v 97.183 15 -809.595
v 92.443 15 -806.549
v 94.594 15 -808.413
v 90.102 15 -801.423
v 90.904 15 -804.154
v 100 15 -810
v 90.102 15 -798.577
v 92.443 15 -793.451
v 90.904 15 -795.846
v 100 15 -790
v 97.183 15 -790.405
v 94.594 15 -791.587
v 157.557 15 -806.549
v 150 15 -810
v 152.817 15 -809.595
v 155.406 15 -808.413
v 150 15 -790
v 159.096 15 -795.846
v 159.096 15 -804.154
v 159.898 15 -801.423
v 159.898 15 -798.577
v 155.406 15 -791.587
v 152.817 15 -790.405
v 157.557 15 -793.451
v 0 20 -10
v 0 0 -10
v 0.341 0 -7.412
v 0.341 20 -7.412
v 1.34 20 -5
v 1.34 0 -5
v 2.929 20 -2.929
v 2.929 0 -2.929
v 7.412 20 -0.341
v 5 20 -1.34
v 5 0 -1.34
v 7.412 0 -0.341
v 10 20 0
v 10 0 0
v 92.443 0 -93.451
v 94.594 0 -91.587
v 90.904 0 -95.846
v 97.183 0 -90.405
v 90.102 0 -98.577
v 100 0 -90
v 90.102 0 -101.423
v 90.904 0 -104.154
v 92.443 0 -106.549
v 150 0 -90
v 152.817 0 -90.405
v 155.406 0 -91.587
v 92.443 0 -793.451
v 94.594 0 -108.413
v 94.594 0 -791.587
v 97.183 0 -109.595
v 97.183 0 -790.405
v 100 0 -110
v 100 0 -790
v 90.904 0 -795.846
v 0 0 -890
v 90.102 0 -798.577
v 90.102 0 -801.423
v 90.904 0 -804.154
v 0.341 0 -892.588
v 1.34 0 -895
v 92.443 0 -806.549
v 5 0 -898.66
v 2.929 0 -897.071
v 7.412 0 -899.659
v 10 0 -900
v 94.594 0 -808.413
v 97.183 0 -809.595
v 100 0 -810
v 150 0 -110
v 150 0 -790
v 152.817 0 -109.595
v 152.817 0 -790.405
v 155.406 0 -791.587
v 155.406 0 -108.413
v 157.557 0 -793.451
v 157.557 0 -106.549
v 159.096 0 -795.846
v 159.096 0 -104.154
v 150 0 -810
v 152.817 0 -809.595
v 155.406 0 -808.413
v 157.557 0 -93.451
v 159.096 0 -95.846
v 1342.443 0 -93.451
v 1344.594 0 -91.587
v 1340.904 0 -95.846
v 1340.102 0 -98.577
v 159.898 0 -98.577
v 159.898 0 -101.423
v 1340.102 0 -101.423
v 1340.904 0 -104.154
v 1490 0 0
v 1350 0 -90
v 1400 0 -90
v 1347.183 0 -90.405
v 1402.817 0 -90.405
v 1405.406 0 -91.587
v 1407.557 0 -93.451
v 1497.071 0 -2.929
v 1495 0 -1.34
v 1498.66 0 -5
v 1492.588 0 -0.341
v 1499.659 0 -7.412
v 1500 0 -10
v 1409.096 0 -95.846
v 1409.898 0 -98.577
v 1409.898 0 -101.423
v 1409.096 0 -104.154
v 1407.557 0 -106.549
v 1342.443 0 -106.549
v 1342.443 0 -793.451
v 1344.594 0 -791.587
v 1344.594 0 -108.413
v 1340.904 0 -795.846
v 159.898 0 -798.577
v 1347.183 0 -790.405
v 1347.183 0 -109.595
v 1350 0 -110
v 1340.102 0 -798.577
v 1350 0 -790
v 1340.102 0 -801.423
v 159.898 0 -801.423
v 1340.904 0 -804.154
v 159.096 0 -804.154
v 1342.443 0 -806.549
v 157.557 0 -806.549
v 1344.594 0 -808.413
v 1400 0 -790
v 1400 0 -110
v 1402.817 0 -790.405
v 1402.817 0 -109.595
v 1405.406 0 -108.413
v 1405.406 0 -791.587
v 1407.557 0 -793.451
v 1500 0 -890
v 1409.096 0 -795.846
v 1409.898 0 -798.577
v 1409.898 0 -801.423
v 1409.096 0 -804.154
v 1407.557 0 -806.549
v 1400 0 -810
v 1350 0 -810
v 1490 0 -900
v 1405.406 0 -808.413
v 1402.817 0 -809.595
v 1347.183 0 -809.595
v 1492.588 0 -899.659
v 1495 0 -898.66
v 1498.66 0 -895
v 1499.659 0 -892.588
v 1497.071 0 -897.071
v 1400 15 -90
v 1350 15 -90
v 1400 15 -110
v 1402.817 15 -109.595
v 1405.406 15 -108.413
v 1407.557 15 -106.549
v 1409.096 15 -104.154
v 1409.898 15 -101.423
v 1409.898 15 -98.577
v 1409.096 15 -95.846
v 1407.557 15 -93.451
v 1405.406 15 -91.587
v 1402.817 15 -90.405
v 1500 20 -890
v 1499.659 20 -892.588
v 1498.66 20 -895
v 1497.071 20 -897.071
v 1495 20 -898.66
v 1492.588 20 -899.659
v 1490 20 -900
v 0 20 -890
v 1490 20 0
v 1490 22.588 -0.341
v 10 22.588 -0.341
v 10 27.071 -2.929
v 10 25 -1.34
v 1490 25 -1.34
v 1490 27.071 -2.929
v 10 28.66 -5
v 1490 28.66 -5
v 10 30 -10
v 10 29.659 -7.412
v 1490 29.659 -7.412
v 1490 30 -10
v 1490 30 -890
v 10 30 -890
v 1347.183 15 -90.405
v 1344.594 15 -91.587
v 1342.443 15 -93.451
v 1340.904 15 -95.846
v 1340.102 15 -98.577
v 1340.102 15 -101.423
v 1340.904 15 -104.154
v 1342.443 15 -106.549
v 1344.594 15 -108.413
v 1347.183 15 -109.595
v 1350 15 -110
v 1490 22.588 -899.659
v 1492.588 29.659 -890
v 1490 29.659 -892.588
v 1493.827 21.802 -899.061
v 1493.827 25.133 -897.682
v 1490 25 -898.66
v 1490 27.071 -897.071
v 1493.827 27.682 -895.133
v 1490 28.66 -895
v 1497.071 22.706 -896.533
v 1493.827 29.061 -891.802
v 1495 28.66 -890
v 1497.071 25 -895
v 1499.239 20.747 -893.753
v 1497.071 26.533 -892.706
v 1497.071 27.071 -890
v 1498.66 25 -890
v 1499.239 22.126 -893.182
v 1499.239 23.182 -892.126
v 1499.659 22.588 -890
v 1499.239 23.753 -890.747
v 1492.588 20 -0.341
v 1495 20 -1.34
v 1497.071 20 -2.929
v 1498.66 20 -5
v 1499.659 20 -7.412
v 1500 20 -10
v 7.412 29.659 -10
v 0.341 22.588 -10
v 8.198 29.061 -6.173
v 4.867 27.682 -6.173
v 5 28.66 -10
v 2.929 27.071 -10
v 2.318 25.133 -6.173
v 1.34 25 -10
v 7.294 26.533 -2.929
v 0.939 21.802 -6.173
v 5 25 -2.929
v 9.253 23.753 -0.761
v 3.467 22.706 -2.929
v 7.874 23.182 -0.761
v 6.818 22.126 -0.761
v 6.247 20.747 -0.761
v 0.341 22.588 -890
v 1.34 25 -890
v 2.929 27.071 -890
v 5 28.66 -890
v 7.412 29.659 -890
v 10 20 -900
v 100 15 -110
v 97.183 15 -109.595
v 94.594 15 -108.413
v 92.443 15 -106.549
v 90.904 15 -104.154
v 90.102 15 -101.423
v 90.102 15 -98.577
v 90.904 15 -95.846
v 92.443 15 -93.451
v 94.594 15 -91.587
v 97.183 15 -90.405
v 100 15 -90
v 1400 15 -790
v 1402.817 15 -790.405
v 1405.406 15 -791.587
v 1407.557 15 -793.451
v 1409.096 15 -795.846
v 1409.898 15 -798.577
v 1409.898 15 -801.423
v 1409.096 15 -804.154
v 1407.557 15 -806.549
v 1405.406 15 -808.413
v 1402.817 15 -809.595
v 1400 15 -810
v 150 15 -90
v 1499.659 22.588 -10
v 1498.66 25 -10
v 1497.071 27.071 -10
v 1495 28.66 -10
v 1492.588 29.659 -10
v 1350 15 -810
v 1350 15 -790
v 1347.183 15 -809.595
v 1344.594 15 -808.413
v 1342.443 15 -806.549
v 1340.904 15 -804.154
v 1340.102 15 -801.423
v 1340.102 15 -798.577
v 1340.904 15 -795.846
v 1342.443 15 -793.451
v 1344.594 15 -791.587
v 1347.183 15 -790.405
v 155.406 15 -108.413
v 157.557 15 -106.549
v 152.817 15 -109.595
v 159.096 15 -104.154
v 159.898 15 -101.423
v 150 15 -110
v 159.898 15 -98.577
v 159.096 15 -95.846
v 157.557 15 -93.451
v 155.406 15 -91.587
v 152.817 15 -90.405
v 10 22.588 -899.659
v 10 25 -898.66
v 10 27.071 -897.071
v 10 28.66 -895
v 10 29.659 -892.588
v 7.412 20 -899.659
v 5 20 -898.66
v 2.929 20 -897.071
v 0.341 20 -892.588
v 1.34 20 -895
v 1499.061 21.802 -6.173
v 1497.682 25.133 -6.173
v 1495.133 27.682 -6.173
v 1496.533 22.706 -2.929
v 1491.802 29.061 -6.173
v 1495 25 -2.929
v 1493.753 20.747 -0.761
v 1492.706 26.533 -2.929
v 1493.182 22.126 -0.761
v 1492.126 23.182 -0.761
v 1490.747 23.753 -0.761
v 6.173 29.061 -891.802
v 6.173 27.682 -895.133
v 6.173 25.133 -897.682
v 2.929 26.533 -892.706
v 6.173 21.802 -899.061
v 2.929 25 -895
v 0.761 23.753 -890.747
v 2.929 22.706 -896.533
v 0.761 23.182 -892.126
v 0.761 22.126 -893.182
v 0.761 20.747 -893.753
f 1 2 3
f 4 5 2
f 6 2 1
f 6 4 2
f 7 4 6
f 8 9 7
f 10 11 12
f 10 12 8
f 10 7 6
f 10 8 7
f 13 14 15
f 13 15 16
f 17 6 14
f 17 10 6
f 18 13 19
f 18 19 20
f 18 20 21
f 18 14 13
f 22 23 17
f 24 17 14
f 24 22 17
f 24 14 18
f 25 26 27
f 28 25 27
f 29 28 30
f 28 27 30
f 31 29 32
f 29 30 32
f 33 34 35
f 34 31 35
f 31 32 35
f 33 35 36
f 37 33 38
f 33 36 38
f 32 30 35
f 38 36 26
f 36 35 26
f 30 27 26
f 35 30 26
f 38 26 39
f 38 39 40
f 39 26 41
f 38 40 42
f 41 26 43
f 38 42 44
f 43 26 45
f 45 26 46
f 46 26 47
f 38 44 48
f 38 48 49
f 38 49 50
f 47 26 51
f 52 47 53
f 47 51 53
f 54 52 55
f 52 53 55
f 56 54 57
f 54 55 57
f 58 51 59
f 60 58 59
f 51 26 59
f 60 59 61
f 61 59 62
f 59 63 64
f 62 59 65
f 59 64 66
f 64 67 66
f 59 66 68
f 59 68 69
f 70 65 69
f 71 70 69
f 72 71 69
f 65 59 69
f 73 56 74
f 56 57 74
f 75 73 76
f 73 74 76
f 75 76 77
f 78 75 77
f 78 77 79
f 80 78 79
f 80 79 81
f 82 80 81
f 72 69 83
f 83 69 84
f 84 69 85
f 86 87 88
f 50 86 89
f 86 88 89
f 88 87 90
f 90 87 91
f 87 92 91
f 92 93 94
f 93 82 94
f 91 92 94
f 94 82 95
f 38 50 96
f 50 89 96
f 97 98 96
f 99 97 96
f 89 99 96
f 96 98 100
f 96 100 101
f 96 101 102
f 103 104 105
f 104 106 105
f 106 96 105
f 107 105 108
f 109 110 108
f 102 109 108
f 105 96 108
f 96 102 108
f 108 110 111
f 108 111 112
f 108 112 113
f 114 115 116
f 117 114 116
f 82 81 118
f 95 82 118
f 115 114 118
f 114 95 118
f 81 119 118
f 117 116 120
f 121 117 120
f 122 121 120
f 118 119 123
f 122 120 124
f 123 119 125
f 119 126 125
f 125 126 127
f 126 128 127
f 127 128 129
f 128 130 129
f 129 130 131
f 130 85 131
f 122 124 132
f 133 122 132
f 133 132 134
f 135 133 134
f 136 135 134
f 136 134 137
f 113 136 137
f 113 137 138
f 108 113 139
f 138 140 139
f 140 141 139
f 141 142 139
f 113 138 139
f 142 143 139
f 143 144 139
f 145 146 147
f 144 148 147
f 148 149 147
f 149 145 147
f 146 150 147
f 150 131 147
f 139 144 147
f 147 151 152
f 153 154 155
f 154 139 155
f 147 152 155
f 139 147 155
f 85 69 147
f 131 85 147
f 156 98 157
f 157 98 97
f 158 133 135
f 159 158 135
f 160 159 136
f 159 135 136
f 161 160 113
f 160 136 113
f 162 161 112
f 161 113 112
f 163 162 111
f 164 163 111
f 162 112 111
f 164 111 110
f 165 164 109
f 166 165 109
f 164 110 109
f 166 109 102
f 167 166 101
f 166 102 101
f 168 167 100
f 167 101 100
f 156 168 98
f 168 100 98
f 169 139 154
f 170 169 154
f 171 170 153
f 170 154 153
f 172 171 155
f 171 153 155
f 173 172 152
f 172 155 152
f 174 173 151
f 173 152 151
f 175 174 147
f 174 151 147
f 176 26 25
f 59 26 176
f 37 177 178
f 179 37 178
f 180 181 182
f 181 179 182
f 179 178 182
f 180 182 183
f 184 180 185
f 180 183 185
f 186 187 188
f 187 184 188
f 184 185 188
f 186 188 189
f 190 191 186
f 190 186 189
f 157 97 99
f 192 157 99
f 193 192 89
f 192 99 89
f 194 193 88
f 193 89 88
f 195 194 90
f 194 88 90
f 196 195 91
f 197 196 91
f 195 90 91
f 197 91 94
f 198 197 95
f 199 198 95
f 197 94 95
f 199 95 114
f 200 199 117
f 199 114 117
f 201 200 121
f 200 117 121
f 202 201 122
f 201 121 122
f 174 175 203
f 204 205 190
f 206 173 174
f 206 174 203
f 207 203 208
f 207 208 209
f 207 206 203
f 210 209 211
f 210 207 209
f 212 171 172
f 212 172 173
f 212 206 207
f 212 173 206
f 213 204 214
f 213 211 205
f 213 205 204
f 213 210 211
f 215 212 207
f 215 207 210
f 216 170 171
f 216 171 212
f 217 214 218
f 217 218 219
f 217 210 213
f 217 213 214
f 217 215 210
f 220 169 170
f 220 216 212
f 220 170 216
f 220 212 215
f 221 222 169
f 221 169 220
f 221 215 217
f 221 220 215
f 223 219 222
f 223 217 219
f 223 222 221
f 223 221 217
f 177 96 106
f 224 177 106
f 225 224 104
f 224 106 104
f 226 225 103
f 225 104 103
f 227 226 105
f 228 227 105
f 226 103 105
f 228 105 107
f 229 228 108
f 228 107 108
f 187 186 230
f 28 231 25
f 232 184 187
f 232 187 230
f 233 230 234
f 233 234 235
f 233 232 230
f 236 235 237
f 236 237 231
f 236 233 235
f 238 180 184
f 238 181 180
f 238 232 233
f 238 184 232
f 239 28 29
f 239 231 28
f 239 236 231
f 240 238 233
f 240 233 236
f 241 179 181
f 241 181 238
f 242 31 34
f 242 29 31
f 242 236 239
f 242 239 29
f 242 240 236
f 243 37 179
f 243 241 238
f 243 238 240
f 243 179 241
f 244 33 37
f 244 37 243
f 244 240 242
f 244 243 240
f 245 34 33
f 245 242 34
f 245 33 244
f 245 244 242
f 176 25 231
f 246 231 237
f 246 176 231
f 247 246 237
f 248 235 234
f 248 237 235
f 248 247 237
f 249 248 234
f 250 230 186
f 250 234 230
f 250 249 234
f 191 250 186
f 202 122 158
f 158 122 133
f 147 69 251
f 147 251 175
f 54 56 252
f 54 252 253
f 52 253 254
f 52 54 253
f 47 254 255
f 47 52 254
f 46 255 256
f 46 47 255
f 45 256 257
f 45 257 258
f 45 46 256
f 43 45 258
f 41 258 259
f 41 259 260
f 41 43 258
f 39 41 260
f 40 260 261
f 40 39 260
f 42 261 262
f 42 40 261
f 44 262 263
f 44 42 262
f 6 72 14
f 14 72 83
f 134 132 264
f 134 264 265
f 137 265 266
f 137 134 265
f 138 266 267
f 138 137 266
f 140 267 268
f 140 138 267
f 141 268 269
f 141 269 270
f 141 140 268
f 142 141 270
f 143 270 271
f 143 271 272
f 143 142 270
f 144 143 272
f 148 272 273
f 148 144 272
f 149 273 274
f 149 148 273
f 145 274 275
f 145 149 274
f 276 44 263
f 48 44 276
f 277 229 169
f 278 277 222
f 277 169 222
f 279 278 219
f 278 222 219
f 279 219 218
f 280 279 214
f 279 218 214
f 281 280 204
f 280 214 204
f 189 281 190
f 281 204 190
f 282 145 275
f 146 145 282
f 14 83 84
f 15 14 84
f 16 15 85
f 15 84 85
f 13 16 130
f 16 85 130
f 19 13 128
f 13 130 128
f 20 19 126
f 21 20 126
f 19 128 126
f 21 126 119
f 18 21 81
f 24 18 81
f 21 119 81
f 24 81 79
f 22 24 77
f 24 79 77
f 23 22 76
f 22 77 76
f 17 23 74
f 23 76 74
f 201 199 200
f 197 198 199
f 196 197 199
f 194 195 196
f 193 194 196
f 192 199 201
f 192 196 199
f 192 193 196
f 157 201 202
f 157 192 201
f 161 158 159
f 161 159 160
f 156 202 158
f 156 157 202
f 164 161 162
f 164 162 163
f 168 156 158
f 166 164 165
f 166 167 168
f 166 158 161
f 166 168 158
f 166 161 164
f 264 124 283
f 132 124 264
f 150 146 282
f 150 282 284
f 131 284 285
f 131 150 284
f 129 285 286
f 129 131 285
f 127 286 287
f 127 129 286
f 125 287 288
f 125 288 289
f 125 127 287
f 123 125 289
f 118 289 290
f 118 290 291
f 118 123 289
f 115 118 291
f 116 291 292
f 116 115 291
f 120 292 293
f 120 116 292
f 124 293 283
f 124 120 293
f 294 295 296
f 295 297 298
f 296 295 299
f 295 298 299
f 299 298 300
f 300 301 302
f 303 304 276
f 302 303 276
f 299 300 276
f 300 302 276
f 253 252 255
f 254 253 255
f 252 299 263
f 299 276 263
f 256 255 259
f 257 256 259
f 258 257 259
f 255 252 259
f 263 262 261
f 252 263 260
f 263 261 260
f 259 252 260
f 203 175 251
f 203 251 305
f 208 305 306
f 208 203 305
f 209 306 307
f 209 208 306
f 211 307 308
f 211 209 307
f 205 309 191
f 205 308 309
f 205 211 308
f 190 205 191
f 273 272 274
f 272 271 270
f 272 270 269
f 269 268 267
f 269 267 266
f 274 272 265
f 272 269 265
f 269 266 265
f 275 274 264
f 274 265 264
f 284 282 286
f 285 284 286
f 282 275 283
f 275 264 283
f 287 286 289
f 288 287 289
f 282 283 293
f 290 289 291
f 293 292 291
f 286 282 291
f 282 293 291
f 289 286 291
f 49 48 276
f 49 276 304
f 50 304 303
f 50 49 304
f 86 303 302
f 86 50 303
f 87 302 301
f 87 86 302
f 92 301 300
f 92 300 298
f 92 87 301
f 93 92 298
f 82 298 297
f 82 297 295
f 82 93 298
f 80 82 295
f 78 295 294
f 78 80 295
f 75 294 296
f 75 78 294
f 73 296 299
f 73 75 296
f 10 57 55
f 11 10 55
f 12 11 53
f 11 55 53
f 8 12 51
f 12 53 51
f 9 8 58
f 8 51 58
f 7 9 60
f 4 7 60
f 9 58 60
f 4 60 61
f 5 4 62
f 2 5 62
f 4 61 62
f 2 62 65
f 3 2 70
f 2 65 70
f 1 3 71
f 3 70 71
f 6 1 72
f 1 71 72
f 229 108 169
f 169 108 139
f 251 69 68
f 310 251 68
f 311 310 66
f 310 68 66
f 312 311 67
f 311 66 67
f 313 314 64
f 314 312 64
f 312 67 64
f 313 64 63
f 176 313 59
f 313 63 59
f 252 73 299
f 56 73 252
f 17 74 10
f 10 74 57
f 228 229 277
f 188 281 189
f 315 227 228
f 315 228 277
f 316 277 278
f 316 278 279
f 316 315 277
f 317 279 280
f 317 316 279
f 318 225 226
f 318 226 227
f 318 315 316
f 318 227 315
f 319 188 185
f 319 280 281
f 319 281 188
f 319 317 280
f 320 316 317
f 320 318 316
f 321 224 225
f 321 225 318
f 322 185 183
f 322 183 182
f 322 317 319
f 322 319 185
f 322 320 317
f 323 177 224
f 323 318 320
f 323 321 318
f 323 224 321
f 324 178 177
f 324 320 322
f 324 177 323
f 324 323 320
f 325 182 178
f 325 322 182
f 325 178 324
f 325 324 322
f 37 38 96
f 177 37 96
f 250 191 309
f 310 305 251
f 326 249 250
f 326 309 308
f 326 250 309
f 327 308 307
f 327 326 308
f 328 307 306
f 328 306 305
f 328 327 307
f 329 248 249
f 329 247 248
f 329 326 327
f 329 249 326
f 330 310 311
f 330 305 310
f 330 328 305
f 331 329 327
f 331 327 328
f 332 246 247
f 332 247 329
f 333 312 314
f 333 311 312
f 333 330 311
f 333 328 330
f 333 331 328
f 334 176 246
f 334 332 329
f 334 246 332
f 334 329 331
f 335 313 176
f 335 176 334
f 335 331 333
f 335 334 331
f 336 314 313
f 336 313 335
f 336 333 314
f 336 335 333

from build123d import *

# Parameters (mm, degrees)
ESQUISSE1_W             = 1500
ESQUISSE1_H             = 900
BOSS_EXTRU_1_DEPTH      = 30
CONG_1_R                = 10
CONG_2_R                = 10
ENL_V_MAT_EXTRU_1_DEPTH = 15


with BuildPart() as part:
    # Esquisse1 → Boss.-Extru.1 (new body)
    with BuildSketch(Plane(origin=(0, 0, 0), x_dir=(1, 0, 0), z_dir=(0, 1, 0))):
        with Locations((750, 450)):
            Rectangle(ESQUISSE1_W, ESQUISSE1_H)
    extrude(amount=BOSS_EXTRU_1_DEPTH)

    # Congé1
    cong_1_edges = [part.edges().sort_by_distance(p)[0] for p in [
        (1500, 30, -450),
        (750, 30, -900),
        (0, 30, -450),
        (750, 30, 0),
    ]]
    fillet(cong_1_edges, radius=CONG_1_R)

    # Congé2
    # the kernel refuses this fillet: 10 mm, written as the material it takes off along each edge
    with BuildSketch(Plane(origin=(1490, 20, -10), x_dir=(1, 0, 0), z_dir=(0, 0, 1))) as cong_2_piece_1_section:
        Polygon((0, 0), (CONG_2_R * 1.02, 0), (CONG_2_R * 1.02, CONG_2_R * 1.02), (0, CONG_2_R * 1.02), align=None)
    cong_2_piece_1 = extrude(amount=CONG_2_R * 1.02, mode=Mode.PRIVATE)
    cong_2_piece_1 = cong_2_piece_1 - Plane(origin=(1490, 20, -10), x_dir=(-0.7071067811865475, -0.7071067811865475, 0), z_dir=(0, 0, 1)) * Sphere(CONG_2_R, mode=Mode.PRIVATE)
    add(cong_2_piece_1, mode=Mode.SUBTRACT)
    with BuildSketch(Plane(origin=(10, 20, -10), x_dir=(-1, 0, 0), z_dir=(0, 0, 1))) as cong_2_piece_2_section:
        Polygon((0, 0), (CONG_2_R * 1.02, 0), (CONG_2_R * 1.02, -CONG_2_R * 1.02), (0, -CONG_2_R * 1.02), align=None)
    cong_2_piece_2 = extrude(amount=CONG_2_R * 1.02, mode=Mode.PRIVATE)
    cong_2_piece_2 = cong_2_piece_2 - Plane(origin=(10, 20, -10), x_dir=(0.7071067811865475, -0.7071067811865475, 0), z_dir=(0, 0, 1)) * Sphere(CONG_2_R, mode=Mode.PRIVATE)
    add(cong_2_piece_2, mode=Mode.SUBTRACT)
    with BuildSketch(Plane(origin=(1490, 20, -890), x_dir=(0, 0, -1), z_dir=(1, 0, 0))) as cong_2_piece_3_section:
        Polygon((0, 0), (CONG_2_R * 1.02, 0), (CONG_2_R * 1.02, CONG_2_R * 1.02), (0, CONG_2_R * 1.02), align=None)
    cong_2_piece_3 = extrude(amount=CONG_2_R * 1.02, mode=Mode.PRIVATE)
    cong_2_piece_3 = cong_2_piece_3 - Plane(origin=(1490, 20, -890), x_dir=(0, -0.7071067811865475, 0.7071067811865475), z_dir=(1, 0, 0)) * Sphere(CONG_2_R, mode=Mode.PRIVATE)
    add(cong_2_piece_3, mode=Mode.SUBTRACT)
    with BuildSketch(Plane(origin=(10, 20, -890), x_dir=(0, 0, -1), z_dir=(-1, 0, 0))) as cong_2_piece_4_section:
        Polygon((0, 0), (CONG_2_R * 1.02, 0), (CONG_2_R * 1.02, -CONG_2_R * 1.02), (0, -CONG_2_R * 1.02), align=None)
    cong_2_piece_4 = extrude(amount=CONG_2_R * 1.02, mode=Mode.PRIVATE)
    cong_2_piece_4 = cong_2_piece_4 - Plane(origin=(10, 20, -890), x_dir=(0, -0.7071067811865475, 0.7071067811865475), z_dir=(-1, 0, 0)) * Sphere(CONG_2_R, mode=Mode.PRIVATE)
    add(cong_2_piece_4, mode=Mode.SUBTRACT)
    with BuildSketch(Plane(origin=(0, -25, -900), x_dir=(0, 0, 1), z_dir=(0, 1, 0)), Plane(origin=(0, -25, 0), x_dir=(1, 0, 0), z_dir=(0, 1, 0))) as cong_2_piece_5:
        with BuildLine():
            CenterArc((CONG_2_R, CONG_2_R), CONG_2_R, 180, 90)
            Line((0, CONG_2_R), (0, 0))
            Line((0, 0), (CONG_2_R, 0))
        make_face()
    extrude(amount=45, mode=Mode.SUBTRACT)
    with BuildSketch(Plane(origin=(1500, -25, -900), x_dir=(0, 0, 1), z_dir=(0, 1, 0)), Plane(origin=(1500, -25, 0), x_dir=(-1, 0, 0), z_dir=(0, 1, 0))) as cong_2_piece_6:
        with BuildLine():
            CenterArc((CONG_2_R, -CONG_2_R), CONG_2_R, 90, 90)
            Line((0, -CONG_2_R), (0, 0))
            Line((0, 0), (CONG_2_R, 0))
        make_face()
    extrude(amount=45, mode=Mode.SUBTRACT)

    # Esquisse2 → Enlèv. mat.-Extru.1 (cut)
    with BuildSketch(Plane.XZ):
        with BuildLine():
            Line((100, -90), (150, -90))
            ThreePointArc((150, -90), (160, -100), (150, -110))
            Line((150, -110), (100, -110))
            ThreePointArc((100, -110), (90, -100), (100, -90))
        make_face()
        with BuildLine():
            Line((1400, -90), (1350, -90))
            ThreePointArc((1350, -90), (1340, -100), (1350, -110))
            Line((1350, -110), (1400, -110))
            ThreePointArc((1400, -110), (1410, -100), (1400, -90))
        make_face()
        with BuildLine():
            Line((1400, -810), (1350, -810))
            ThreePointArc((1350, -810), (1340, -800), (1350, -790))
            Line((1350, -790), (1400, -790))
            ThreePointArc((1400, -790), (1410, -800), (1400, -810))
        make_face()
        with BuildLine():
            Line((100, -810), (150, -810))
            ThreePointArc((150, -810), (160, -800), (150, -790))
            Line((150, -790), (100, -790))
            ThreePointArc((100, -790), (90, -800), (100, -810))
        make_face()
    extrude(amount=-ENL_V_MAT_EXTRU_1_DEPTH, mode=Mode.SUBTRACT)


solid = part.part
